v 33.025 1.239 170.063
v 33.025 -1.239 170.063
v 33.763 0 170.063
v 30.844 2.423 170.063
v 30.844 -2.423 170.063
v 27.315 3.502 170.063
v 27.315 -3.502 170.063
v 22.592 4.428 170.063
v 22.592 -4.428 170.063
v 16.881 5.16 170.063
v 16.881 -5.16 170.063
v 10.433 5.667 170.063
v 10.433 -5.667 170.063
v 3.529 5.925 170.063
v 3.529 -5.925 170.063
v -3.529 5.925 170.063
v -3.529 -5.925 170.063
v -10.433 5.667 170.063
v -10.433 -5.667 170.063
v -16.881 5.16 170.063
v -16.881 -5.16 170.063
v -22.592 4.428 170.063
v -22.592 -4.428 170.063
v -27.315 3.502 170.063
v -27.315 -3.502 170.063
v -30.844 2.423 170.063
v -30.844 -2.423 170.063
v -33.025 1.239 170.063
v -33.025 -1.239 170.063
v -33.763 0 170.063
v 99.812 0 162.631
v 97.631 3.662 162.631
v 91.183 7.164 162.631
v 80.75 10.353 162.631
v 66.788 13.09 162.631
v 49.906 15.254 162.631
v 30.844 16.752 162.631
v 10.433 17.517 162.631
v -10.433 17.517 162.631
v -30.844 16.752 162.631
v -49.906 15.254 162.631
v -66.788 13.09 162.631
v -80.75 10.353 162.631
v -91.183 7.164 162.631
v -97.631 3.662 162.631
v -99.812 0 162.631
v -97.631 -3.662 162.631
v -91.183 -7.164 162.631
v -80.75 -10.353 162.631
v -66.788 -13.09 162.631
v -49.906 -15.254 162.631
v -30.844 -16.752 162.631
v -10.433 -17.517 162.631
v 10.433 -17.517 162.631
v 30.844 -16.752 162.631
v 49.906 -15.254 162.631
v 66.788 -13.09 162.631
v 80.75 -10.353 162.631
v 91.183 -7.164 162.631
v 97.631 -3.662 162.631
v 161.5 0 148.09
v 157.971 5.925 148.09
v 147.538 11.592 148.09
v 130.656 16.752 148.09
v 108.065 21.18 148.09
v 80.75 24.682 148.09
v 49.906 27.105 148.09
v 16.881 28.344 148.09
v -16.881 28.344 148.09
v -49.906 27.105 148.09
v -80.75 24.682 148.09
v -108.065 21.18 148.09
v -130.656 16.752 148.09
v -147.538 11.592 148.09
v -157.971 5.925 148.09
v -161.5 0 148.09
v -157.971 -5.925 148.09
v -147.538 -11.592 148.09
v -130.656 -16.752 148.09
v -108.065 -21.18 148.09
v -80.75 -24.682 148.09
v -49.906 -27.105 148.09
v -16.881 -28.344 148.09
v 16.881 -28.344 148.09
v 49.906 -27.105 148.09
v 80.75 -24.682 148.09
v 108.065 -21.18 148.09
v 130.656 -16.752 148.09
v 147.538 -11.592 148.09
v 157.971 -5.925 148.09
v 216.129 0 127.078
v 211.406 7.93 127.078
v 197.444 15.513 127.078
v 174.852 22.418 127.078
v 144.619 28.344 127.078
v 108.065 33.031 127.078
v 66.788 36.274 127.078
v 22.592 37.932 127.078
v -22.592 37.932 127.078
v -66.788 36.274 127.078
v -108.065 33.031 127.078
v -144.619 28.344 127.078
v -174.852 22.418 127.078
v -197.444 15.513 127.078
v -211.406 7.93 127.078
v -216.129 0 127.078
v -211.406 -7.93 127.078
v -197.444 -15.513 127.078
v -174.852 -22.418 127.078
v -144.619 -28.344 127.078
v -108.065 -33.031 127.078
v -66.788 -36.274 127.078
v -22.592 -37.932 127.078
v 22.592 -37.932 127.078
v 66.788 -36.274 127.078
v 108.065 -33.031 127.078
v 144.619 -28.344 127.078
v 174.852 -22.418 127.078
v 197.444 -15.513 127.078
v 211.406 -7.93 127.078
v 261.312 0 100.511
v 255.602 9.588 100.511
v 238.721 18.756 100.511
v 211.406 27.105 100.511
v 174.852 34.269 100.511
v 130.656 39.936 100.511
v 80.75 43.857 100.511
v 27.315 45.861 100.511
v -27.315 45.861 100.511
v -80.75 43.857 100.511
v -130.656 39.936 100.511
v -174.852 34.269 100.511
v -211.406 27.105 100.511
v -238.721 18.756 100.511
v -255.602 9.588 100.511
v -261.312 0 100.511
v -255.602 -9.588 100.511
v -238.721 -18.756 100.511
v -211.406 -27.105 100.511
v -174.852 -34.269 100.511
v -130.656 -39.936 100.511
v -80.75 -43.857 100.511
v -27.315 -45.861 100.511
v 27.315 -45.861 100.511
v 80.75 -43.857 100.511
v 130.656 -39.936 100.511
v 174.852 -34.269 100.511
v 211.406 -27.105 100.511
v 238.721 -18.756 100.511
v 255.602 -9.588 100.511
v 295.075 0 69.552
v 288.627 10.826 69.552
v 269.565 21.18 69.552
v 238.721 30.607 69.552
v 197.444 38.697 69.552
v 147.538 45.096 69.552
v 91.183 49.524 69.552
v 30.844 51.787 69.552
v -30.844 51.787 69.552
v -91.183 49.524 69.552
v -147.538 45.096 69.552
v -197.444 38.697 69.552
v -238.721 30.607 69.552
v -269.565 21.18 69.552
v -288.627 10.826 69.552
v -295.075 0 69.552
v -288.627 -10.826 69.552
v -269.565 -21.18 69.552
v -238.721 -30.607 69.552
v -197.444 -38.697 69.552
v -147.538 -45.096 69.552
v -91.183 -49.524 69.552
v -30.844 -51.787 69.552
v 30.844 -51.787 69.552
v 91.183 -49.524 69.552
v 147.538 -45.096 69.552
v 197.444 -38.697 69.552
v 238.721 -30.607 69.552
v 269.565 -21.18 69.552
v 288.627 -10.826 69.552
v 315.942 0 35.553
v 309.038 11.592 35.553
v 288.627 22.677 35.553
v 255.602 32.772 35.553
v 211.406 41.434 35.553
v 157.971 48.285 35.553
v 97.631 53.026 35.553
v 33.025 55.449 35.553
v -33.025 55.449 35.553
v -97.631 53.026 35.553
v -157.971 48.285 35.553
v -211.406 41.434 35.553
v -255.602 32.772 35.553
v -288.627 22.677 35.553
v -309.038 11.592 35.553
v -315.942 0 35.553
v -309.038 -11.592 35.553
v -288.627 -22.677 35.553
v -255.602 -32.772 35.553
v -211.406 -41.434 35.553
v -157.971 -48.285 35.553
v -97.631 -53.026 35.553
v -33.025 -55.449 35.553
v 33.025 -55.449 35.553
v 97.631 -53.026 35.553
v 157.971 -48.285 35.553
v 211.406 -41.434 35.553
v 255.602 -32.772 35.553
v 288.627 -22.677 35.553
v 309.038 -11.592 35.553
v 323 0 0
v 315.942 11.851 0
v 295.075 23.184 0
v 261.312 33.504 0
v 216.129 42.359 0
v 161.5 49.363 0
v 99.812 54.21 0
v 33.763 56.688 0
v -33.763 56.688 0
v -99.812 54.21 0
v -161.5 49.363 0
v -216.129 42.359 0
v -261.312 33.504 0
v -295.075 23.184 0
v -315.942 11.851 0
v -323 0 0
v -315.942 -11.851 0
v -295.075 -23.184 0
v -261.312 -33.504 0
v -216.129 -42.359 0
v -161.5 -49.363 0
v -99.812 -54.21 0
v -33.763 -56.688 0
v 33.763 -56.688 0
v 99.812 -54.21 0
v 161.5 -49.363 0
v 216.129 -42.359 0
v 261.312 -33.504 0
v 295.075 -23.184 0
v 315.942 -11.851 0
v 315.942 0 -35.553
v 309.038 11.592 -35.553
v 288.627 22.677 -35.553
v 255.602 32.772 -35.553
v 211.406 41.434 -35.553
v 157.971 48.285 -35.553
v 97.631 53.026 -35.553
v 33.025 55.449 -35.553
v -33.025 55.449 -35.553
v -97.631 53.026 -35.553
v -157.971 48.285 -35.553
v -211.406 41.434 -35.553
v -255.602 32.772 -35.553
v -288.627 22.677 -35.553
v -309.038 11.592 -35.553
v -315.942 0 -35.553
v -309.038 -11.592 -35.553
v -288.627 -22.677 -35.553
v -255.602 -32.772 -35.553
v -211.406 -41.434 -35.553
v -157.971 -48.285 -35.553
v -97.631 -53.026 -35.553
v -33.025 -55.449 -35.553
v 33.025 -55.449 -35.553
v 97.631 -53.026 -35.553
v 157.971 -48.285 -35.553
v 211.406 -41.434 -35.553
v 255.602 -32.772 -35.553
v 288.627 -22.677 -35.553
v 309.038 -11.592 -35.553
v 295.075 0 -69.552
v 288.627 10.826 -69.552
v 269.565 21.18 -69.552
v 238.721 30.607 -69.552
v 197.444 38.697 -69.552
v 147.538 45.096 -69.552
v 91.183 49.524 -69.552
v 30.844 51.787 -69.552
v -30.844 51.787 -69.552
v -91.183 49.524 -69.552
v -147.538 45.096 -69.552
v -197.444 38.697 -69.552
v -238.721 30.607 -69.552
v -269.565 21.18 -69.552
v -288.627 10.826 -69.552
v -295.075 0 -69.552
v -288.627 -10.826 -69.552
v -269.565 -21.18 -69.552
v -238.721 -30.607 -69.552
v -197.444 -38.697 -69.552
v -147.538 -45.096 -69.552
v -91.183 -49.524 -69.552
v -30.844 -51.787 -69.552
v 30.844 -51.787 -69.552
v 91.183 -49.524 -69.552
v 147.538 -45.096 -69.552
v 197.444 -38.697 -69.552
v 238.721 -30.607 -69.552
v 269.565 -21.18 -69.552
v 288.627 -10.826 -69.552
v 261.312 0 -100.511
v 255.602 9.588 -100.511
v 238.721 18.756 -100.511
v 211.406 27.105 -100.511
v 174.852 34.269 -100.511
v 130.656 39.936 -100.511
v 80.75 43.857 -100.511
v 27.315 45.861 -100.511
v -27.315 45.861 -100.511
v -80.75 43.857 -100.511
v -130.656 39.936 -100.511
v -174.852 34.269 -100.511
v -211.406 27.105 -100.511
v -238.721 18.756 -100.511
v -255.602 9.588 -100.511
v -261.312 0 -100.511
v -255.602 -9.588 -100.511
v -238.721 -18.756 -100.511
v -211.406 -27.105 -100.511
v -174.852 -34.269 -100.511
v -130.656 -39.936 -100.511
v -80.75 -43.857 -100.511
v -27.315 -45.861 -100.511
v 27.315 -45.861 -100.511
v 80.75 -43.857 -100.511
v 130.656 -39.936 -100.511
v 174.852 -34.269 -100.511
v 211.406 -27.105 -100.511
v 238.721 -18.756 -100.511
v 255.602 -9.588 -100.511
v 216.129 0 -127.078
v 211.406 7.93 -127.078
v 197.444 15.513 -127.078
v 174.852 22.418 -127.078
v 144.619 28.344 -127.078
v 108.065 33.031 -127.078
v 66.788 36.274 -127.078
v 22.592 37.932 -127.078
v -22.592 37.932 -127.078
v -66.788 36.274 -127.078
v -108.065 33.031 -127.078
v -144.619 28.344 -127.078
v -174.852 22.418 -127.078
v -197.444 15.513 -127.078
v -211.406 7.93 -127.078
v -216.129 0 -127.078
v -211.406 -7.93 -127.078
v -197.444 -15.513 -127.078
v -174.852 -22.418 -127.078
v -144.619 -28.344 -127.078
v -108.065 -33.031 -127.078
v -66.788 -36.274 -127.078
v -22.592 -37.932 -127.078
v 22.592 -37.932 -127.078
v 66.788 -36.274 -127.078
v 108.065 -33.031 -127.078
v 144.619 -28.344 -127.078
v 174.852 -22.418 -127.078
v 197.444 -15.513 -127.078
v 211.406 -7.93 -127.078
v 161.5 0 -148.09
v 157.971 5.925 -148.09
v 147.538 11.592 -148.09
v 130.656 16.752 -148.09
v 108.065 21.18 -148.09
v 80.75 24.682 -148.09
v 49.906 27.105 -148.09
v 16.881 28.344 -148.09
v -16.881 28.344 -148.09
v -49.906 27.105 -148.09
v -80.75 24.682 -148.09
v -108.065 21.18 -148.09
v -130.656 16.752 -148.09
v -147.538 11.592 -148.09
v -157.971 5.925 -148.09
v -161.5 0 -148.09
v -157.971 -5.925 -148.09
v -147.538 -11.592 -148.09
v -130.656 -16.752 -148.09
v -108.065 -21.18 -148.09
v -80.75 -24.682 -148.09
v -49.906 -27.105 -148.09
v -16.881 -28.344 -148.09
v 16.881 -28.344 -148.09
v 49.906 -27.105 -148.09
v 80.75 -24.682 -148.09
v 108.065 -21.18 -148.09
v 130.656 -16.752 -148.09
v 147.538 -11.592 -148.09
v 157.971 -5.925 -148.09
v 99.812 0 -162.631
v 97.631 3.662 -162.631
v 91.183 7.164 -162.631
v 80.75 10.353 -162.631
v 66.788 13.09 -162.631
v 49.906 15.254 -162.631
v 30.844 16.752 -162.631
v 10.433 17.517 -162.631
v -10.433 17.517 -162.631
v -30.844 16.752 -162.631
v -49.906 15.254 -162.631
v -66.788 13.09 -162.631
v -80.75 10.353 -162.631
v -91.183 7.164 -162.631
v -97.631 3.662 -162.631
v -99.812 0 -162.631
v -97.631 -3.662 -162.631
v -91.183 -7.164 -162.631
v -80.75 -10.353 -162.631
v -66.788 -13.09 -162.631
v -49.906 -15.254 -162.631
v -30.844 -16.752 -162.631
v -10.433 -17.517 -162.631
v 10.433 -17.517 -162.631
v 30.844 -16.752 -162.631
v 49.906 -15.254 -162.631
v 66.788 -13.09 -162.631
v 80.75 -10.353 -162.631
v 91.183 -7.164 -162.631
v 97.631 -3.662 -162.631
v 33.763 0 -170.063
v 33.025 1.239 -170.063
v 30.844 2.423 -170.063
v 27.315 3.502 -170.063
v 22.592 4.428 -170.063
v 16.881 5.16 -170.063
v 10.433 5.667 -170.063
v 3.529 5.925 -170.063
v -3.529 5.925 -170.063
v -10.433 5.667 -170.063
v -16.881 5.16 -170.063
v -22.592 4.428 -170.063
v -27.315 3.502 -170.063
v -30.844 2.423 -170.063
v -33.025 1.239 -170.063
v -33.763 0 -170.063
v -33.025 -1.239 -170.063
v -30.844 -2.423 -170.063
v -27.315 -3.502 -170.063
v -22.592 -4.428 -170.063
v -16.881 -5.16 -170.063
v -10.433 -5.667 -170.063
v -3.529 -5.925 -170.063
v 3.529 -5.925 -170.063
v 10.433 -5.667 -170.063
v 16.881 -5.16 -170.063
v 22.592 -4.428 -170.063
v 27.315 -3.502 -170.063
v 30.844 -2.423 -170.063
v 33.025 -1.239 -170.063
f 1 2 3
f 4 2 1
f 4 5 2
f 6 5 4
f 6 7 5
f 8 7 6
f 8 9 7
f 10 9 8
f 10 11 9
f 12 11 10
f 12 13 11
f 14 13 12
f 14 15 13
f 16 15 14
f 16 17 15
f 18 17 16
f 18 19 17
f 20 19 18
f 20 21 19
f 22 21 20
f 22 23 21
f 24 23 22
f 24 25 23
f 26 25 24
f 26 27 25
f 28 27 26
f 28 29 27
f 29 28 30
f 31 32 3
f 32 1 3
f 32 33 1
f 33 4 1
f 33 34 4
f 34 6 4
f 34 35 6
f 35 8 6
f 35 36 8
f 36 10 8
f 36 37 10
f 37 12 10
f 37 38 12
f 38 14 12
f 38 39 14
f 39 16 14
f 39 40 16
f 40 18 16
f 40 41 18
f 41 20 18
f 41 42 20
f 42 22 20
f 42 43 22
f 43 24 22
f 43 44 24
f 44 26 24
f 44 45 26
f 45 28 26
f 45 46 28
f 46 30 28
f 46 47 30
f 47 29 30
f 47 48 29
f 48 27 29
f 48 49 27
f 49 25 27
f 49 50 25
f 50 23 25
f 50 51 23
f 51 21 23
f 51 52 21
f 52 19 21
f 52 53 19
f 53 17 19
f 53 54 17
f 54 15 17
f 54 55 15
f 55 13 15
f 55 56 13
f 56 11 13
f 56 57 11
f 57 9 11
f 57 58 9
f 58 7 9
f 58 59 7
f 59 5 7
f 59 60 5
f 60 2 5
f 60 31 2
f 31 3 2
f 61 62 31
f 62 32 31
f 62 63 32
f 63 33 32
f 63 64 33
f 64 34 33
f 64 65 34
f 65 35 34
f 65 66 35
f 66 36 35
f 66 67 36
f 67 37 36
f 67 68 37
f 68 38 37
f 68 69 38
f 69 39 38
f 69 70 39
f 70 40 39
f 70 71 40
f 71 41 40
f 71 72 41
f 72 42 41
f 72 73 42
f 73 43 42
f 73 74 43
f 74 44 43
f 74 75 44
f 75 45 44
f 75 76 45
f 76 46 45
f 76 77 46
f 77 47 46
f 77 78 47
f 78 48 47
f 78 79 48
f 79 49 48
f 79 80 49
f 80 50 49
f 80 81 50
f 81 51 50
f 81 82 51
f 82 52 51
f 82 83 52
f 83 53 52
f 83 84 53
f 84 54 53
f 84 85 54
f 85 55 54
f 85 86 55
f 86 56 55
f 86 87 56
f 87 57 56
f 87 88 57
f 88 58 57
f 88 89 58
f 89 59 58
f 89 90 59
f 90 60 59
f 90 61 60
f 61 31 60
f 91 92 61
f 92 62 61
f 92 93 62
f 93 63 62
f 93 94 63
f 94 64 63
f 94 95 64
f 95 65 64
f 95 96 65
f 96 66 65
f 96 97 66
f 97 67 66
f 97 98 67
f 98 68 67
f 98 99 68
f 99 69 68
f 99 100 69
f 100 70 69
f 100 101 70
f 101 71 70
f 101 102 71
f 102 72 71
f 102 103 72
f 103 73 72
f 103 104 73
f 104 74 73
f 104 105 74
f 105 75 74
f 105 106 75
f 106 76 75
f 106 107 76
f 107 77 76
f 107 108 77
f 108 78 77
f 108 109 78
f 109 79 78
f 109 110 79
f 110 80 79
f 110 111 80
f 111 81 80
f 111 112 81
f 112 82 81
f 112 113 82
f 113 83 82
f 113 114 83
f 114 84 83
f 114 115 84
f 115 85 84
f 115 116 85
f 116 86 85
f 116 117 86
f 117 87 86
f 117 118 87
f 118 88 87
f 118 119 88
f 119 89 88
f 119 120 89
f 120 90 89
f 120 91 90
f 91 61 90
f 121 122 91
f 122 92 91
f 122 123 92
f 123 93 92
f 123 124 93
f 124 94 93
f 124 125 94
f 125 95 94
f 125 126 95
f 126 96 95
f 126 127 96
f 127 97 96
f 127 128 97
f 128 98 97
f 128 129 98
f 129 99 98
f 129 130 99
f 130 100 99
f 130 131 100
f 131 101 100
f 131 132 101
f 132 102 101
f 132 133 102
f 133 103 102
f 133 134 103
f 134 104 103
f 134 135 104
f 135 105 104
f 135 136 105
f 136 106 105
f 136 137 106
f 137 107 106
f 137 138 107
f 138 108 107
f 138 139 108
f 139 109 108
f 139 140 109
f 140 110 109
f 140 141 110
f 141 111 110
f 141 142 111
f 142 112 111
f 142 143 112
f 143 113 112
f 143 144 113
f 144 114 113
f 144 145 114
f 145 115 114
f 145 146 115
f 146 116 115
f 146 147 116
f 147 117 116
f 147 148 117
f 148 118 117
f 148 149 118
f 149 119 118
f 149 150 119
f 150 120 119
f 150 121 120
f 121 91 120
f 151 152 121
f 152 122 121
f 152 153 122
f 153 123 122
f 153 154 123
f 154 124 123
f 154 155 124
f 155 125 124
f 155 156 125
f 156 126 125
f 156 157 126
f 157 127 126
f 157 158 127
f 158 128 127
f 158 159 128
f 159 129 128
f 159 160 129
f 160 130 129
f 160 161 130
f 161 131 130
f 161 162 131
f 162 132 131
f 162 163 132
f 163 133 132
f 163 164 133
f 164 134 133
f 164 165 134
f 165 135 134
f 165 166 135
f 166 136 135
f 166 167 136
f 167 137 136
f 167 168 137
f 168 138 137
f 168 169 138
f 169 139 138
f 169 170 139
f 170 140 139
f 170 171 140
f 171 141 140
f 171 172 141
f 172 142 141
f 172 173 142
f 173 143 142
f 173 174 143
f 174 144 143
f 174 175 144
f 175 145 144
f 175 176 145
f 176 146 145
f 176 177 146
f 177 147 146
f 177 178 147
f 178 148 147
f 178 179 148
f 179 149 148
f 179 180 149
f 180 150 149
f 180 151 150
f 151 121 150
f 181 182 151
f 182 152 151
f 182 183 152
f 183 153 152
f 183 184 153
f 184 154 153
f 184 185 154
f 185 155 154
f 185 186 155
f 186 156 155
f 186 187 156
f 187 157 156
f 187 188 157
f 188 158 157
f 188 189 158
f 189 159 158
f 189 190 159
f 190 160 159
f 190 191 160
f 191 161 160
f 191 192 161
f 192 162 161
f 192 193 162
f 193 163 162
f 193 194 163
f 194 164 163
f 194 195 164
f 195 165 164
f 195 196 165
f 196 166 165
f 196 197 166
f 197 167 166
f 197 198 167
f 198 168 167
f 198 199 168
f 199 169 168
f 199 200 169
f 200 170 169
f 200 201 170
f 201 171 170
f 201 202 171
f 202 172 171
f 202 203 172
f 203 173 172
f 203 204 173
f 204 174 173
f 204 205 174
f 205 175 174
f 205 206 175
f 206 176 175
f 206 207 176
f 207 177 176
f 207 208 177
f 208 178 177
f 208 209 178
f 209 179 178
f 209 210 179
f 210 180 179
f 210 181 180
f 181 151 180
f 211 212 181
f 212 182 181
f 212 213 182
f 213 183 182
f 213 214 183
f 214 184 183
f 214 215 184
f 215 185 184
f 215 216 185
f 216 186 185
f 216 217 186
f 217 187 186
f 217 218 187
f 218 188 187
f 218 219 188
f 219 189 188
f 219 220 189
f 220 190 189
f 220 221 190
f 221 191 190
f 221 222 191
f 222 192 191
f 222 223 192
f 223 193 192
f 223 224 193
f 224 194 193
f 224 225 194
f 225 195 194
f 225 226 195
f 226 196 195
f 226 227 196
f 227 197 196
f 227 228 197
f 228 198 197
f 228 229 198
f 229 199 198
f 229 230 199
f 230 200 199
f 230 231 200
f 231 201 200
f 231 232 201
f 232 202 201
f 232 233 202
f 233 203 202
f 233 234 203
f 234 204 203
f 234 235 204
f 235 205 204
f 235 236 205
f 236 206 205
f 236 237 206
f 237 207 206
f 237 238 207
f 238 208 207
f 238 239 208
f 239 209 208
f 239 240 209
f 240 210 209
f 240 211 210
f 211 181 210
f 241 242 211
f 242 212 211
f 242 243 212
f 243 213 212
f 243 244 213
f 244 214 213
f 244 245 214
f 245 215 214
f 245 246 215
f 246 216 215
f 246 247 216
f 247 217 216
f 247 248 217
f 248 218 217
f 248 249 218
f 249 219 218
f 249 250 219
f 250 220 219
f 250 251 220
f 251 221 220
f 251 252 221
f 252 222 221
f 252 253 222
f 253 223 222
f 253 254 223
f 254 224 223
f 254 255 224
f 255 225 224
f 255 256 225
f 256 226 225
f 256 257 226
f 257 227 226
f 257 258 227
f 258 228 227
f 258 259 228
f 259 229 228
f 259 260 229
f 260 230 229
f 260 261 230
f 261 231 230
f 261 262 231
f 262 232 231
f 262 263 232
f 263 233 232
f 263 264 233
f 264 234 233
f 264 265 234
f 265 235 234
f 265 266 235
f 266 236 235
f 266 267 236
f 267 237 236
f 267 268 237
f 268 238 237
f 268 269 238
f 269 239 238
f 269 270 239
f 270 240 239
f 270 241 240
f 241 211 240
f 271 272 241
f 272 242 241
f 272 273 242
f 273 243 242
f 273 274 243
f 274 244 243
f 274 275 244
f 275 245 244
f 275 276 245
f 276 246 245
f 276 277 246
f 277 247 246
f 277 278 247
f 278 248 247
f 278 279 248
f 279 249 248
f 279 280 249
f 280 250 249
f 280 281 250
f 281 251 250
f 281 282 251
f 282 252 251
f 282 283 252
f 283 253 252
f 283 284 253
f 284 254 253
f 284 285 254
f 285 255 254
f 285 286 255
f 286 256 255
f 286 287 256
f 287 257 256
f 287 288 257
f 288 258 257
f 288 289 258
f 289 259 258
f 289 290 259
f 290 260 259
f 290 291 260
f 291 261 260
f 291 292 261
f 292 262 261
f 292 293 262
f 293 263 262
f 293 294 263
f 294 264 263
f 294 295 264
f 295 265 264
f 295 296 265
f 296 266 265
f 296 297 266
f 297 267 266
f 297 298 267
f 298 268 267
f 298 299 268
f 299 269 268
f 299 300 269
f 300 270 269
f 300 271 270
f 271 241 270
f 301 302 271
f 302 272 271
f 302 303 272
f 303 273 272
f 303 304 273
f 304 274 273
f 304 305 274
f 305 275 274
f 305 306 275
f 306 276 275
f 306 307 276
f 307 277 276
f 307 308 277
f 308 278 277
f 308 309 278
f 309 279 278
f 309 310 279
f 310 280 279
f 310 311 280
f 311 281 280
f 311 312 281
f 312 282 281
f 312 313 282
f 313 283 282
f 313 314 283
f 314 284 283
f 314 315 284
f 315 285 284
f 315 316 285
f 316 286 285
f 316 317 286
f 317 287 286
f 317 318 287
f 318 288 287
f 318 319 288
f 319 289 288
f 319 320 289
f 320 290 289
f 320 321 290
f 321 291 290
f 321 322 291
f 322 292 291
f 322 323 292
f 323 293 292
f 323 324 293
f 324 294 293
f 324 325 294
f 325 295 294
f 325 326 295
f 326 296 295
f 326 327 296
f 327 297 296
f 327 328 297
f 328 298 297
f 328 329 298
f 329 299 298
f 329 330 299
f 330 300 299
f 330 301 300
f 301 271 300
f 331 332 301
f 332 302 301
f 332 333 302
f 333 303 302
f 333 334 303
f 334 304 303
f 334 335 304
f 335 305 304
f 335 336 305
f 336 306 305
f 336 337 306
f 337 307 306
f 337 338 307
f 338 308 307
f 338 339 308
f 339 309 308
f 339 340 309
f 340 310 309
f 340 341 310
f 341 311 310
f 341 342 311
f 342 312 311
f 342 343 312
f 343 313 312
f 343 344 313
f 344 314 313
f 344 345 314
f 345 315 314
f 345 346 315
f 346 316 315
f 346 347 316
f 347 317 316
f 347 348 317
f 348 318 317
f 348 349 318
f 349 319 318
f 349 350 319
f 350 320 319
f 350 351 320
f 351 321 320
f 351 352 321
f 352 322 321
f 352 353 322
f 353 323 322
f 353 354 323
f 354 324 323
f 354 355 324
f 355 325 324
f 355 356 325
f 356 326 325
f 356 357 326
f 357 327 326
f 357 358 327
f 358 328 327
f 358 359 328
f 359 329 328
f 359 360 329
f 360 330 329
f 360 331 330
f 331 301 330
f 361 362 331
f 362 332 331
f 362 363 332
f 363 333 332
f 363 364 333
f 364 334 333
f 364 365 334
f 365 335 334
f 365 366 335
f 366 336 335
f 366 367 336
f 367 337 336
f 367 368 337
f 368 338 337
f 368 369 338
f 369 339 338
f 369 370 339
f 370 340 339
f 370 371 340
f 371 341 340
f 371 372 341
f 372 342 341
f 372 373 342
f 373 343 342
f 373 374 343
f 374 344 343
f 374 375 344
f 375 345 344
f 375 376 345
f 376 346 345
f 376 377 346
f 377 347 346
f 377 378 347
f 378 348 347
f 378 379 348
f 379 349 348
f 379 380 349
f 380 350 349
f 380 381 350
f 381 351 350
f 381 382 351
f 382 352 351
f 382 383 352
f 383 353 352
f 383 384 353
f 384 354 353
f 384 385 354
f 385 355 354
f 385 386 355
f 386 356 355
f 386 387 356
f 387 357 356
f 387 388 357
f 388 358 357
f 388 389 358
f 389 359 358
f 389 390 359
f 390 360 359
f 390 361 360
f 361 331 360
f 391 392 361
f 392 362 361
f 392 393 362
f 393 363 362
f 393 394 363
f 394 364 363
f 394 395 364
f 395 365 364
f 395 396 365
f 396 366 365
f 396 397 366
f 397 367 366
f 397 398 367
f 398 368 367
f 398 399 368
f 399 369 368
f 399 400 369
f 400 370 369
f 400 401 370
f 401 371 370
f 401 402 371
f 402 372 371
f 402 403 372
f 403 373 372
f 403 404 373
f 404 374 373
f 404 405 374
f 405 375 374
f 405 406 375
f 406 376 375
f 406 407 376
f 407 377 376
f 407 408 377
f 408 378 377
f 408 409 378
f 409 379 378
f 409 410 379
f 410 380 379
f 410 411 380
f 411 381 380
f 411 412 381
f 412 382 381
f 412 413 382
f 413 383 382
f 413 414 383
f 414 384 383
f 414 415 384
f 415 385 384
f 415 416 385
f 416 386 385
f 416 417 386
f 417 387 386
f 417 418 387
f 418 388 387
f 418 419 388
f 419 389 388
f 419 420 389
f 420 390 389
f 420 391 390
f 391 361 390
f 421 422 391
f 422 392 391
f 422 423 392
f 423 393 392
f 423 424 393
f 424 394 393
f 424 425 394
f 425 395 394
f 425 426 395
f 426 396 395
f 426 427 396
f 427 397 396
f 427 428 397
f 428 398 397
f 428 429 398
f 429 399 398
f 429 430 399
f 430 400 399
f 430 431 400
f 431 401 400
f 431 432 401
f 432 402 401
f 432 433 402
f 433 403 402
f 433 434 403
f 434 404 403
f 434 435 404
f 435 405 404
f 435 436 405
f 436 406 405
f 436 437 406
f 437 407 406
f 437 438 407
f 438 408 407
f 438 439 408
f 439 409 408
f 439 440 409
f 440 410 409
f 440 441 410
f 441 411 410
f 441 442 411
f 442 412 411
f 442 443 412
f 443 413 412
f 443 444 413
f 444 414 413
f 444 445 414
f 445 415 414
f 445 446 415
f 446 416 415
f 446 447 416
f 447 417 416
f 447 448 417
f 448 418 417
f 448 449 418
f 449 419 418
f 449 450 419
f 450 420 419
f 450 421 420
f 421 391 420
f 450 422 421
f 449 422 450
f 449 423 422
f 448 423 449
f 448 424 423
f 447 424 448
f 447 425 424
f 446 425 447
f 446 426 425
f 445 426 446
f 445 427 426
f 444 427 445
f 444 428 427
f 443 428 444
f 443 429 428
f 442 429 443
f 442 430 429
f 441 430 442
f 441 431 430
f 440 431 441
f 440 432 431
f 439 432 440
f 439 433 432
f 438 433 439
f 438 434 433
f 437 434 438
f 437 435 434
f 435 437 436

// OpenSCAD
// Generated by SolidPython 1.0.1 on 2020-07-29 00:46:52


scale(v = [17, 3, 9]) {
	sphere(r = 19);
}
/***********************************************
*********      SolidPython code:      **********
************************************************
 
# import packages: SolidPython
from solid import *
from solid.utils import *
from itertools import chain, combinations, permutations


class Resize:

    def __init__(self, scad_file):
        self.scad_file = scad_file
        #self.scad_file = import_scad(scad_file)
        # cone/cylinder param:
        self.r1 = 0
        self.r2 = 0
        self.h = 0
        # rectangular prism param:
        self.w = 0
        self.l = 0
        # ellipse param:
        self.r = 0

    # import OpenScad code (file name corresponds to shape)


    # classify shape + parameters
    def assign(self, param1, param2, param3):
        if self.scad_file == 'cone.scad':
            self.r1 = param1
            self.r2 = param2
            self.h = param3
        elif self.scad_file == 'cylinder.scad':
            self.r1 = param1
            self.r2 = param2
            self.h = param3
        elif self.scad_file == 'rectangularPrism.scad':
            self.h = param1
            self.l = param2
            self.w = param3
        else:
            self.r = param1
            self.h = param2

    # resize parameters
    def iterate(self):
        x = range(3, 20, 2)
        i = 1
        if self.scad_file == 'cone.scad':
            tempList = list(permutations(x, 2))
            for temp in tempList:
                param1 = temp[0]
                param2 = temp[1]
                filepath = 'produced_scad_files/' + 'cone' + str(param1) + '_' + str(param2) + '_' + '.scad'
                scad_render_to_file(cylinder(h=param1, r1=param2, r2=0), filepath)

        elif self.scad_file == 'cylinder.scad':
            tempList = list(permutations(x, 3))
            for temp in tempList:
                param1 = temp[0]
                param2 = temp[1]
                filepath = 'produced_scad_files/' + 'cylinder' + str(param1) + '_' + str(param2) + '_' + '.scad'
                scad_render_to_file(cylinder(h=param1, r1=param2, r2=param2), filepath)

        elif self.scad_file == 'rectangularPrism.scad':
            tempList = list(permutations(x, 3))
            for temp in tempList:
                param1 = temp[0]
                param2 = temp[1]
                param3 = temp[2]
                filepath = 'produced_scad_files/' + 'rectangularPrism' + str(param1) + '_' + str(param2) + '_' + str(
                    param3) + '.scad'
                scad_render_to_file(cube(size=(param1, param2, param3)), filepath)

        elif self.scad_file == 'ellipse.scad':
            tempList = list(permutations(x, 4))
            for temp in tempList:
                param1 = temp[0]
                param2 = temp[1]
                param3 = temp[2]
                param4 = temp[3]
                filepath = 'produced_scad_files/' + 'ellipse' + str(param1) + '_' + str(param2) + '_' + str(param3) + '_' + str(param4) + '.scad'
                scad_render_to_file(scale([param1, param2, param3])(sphere(r=param4)), filepath)

    def render_to_scadfile(self):
        scad_render_to_file(scad, 'example.scad') 
 
************************************************/
